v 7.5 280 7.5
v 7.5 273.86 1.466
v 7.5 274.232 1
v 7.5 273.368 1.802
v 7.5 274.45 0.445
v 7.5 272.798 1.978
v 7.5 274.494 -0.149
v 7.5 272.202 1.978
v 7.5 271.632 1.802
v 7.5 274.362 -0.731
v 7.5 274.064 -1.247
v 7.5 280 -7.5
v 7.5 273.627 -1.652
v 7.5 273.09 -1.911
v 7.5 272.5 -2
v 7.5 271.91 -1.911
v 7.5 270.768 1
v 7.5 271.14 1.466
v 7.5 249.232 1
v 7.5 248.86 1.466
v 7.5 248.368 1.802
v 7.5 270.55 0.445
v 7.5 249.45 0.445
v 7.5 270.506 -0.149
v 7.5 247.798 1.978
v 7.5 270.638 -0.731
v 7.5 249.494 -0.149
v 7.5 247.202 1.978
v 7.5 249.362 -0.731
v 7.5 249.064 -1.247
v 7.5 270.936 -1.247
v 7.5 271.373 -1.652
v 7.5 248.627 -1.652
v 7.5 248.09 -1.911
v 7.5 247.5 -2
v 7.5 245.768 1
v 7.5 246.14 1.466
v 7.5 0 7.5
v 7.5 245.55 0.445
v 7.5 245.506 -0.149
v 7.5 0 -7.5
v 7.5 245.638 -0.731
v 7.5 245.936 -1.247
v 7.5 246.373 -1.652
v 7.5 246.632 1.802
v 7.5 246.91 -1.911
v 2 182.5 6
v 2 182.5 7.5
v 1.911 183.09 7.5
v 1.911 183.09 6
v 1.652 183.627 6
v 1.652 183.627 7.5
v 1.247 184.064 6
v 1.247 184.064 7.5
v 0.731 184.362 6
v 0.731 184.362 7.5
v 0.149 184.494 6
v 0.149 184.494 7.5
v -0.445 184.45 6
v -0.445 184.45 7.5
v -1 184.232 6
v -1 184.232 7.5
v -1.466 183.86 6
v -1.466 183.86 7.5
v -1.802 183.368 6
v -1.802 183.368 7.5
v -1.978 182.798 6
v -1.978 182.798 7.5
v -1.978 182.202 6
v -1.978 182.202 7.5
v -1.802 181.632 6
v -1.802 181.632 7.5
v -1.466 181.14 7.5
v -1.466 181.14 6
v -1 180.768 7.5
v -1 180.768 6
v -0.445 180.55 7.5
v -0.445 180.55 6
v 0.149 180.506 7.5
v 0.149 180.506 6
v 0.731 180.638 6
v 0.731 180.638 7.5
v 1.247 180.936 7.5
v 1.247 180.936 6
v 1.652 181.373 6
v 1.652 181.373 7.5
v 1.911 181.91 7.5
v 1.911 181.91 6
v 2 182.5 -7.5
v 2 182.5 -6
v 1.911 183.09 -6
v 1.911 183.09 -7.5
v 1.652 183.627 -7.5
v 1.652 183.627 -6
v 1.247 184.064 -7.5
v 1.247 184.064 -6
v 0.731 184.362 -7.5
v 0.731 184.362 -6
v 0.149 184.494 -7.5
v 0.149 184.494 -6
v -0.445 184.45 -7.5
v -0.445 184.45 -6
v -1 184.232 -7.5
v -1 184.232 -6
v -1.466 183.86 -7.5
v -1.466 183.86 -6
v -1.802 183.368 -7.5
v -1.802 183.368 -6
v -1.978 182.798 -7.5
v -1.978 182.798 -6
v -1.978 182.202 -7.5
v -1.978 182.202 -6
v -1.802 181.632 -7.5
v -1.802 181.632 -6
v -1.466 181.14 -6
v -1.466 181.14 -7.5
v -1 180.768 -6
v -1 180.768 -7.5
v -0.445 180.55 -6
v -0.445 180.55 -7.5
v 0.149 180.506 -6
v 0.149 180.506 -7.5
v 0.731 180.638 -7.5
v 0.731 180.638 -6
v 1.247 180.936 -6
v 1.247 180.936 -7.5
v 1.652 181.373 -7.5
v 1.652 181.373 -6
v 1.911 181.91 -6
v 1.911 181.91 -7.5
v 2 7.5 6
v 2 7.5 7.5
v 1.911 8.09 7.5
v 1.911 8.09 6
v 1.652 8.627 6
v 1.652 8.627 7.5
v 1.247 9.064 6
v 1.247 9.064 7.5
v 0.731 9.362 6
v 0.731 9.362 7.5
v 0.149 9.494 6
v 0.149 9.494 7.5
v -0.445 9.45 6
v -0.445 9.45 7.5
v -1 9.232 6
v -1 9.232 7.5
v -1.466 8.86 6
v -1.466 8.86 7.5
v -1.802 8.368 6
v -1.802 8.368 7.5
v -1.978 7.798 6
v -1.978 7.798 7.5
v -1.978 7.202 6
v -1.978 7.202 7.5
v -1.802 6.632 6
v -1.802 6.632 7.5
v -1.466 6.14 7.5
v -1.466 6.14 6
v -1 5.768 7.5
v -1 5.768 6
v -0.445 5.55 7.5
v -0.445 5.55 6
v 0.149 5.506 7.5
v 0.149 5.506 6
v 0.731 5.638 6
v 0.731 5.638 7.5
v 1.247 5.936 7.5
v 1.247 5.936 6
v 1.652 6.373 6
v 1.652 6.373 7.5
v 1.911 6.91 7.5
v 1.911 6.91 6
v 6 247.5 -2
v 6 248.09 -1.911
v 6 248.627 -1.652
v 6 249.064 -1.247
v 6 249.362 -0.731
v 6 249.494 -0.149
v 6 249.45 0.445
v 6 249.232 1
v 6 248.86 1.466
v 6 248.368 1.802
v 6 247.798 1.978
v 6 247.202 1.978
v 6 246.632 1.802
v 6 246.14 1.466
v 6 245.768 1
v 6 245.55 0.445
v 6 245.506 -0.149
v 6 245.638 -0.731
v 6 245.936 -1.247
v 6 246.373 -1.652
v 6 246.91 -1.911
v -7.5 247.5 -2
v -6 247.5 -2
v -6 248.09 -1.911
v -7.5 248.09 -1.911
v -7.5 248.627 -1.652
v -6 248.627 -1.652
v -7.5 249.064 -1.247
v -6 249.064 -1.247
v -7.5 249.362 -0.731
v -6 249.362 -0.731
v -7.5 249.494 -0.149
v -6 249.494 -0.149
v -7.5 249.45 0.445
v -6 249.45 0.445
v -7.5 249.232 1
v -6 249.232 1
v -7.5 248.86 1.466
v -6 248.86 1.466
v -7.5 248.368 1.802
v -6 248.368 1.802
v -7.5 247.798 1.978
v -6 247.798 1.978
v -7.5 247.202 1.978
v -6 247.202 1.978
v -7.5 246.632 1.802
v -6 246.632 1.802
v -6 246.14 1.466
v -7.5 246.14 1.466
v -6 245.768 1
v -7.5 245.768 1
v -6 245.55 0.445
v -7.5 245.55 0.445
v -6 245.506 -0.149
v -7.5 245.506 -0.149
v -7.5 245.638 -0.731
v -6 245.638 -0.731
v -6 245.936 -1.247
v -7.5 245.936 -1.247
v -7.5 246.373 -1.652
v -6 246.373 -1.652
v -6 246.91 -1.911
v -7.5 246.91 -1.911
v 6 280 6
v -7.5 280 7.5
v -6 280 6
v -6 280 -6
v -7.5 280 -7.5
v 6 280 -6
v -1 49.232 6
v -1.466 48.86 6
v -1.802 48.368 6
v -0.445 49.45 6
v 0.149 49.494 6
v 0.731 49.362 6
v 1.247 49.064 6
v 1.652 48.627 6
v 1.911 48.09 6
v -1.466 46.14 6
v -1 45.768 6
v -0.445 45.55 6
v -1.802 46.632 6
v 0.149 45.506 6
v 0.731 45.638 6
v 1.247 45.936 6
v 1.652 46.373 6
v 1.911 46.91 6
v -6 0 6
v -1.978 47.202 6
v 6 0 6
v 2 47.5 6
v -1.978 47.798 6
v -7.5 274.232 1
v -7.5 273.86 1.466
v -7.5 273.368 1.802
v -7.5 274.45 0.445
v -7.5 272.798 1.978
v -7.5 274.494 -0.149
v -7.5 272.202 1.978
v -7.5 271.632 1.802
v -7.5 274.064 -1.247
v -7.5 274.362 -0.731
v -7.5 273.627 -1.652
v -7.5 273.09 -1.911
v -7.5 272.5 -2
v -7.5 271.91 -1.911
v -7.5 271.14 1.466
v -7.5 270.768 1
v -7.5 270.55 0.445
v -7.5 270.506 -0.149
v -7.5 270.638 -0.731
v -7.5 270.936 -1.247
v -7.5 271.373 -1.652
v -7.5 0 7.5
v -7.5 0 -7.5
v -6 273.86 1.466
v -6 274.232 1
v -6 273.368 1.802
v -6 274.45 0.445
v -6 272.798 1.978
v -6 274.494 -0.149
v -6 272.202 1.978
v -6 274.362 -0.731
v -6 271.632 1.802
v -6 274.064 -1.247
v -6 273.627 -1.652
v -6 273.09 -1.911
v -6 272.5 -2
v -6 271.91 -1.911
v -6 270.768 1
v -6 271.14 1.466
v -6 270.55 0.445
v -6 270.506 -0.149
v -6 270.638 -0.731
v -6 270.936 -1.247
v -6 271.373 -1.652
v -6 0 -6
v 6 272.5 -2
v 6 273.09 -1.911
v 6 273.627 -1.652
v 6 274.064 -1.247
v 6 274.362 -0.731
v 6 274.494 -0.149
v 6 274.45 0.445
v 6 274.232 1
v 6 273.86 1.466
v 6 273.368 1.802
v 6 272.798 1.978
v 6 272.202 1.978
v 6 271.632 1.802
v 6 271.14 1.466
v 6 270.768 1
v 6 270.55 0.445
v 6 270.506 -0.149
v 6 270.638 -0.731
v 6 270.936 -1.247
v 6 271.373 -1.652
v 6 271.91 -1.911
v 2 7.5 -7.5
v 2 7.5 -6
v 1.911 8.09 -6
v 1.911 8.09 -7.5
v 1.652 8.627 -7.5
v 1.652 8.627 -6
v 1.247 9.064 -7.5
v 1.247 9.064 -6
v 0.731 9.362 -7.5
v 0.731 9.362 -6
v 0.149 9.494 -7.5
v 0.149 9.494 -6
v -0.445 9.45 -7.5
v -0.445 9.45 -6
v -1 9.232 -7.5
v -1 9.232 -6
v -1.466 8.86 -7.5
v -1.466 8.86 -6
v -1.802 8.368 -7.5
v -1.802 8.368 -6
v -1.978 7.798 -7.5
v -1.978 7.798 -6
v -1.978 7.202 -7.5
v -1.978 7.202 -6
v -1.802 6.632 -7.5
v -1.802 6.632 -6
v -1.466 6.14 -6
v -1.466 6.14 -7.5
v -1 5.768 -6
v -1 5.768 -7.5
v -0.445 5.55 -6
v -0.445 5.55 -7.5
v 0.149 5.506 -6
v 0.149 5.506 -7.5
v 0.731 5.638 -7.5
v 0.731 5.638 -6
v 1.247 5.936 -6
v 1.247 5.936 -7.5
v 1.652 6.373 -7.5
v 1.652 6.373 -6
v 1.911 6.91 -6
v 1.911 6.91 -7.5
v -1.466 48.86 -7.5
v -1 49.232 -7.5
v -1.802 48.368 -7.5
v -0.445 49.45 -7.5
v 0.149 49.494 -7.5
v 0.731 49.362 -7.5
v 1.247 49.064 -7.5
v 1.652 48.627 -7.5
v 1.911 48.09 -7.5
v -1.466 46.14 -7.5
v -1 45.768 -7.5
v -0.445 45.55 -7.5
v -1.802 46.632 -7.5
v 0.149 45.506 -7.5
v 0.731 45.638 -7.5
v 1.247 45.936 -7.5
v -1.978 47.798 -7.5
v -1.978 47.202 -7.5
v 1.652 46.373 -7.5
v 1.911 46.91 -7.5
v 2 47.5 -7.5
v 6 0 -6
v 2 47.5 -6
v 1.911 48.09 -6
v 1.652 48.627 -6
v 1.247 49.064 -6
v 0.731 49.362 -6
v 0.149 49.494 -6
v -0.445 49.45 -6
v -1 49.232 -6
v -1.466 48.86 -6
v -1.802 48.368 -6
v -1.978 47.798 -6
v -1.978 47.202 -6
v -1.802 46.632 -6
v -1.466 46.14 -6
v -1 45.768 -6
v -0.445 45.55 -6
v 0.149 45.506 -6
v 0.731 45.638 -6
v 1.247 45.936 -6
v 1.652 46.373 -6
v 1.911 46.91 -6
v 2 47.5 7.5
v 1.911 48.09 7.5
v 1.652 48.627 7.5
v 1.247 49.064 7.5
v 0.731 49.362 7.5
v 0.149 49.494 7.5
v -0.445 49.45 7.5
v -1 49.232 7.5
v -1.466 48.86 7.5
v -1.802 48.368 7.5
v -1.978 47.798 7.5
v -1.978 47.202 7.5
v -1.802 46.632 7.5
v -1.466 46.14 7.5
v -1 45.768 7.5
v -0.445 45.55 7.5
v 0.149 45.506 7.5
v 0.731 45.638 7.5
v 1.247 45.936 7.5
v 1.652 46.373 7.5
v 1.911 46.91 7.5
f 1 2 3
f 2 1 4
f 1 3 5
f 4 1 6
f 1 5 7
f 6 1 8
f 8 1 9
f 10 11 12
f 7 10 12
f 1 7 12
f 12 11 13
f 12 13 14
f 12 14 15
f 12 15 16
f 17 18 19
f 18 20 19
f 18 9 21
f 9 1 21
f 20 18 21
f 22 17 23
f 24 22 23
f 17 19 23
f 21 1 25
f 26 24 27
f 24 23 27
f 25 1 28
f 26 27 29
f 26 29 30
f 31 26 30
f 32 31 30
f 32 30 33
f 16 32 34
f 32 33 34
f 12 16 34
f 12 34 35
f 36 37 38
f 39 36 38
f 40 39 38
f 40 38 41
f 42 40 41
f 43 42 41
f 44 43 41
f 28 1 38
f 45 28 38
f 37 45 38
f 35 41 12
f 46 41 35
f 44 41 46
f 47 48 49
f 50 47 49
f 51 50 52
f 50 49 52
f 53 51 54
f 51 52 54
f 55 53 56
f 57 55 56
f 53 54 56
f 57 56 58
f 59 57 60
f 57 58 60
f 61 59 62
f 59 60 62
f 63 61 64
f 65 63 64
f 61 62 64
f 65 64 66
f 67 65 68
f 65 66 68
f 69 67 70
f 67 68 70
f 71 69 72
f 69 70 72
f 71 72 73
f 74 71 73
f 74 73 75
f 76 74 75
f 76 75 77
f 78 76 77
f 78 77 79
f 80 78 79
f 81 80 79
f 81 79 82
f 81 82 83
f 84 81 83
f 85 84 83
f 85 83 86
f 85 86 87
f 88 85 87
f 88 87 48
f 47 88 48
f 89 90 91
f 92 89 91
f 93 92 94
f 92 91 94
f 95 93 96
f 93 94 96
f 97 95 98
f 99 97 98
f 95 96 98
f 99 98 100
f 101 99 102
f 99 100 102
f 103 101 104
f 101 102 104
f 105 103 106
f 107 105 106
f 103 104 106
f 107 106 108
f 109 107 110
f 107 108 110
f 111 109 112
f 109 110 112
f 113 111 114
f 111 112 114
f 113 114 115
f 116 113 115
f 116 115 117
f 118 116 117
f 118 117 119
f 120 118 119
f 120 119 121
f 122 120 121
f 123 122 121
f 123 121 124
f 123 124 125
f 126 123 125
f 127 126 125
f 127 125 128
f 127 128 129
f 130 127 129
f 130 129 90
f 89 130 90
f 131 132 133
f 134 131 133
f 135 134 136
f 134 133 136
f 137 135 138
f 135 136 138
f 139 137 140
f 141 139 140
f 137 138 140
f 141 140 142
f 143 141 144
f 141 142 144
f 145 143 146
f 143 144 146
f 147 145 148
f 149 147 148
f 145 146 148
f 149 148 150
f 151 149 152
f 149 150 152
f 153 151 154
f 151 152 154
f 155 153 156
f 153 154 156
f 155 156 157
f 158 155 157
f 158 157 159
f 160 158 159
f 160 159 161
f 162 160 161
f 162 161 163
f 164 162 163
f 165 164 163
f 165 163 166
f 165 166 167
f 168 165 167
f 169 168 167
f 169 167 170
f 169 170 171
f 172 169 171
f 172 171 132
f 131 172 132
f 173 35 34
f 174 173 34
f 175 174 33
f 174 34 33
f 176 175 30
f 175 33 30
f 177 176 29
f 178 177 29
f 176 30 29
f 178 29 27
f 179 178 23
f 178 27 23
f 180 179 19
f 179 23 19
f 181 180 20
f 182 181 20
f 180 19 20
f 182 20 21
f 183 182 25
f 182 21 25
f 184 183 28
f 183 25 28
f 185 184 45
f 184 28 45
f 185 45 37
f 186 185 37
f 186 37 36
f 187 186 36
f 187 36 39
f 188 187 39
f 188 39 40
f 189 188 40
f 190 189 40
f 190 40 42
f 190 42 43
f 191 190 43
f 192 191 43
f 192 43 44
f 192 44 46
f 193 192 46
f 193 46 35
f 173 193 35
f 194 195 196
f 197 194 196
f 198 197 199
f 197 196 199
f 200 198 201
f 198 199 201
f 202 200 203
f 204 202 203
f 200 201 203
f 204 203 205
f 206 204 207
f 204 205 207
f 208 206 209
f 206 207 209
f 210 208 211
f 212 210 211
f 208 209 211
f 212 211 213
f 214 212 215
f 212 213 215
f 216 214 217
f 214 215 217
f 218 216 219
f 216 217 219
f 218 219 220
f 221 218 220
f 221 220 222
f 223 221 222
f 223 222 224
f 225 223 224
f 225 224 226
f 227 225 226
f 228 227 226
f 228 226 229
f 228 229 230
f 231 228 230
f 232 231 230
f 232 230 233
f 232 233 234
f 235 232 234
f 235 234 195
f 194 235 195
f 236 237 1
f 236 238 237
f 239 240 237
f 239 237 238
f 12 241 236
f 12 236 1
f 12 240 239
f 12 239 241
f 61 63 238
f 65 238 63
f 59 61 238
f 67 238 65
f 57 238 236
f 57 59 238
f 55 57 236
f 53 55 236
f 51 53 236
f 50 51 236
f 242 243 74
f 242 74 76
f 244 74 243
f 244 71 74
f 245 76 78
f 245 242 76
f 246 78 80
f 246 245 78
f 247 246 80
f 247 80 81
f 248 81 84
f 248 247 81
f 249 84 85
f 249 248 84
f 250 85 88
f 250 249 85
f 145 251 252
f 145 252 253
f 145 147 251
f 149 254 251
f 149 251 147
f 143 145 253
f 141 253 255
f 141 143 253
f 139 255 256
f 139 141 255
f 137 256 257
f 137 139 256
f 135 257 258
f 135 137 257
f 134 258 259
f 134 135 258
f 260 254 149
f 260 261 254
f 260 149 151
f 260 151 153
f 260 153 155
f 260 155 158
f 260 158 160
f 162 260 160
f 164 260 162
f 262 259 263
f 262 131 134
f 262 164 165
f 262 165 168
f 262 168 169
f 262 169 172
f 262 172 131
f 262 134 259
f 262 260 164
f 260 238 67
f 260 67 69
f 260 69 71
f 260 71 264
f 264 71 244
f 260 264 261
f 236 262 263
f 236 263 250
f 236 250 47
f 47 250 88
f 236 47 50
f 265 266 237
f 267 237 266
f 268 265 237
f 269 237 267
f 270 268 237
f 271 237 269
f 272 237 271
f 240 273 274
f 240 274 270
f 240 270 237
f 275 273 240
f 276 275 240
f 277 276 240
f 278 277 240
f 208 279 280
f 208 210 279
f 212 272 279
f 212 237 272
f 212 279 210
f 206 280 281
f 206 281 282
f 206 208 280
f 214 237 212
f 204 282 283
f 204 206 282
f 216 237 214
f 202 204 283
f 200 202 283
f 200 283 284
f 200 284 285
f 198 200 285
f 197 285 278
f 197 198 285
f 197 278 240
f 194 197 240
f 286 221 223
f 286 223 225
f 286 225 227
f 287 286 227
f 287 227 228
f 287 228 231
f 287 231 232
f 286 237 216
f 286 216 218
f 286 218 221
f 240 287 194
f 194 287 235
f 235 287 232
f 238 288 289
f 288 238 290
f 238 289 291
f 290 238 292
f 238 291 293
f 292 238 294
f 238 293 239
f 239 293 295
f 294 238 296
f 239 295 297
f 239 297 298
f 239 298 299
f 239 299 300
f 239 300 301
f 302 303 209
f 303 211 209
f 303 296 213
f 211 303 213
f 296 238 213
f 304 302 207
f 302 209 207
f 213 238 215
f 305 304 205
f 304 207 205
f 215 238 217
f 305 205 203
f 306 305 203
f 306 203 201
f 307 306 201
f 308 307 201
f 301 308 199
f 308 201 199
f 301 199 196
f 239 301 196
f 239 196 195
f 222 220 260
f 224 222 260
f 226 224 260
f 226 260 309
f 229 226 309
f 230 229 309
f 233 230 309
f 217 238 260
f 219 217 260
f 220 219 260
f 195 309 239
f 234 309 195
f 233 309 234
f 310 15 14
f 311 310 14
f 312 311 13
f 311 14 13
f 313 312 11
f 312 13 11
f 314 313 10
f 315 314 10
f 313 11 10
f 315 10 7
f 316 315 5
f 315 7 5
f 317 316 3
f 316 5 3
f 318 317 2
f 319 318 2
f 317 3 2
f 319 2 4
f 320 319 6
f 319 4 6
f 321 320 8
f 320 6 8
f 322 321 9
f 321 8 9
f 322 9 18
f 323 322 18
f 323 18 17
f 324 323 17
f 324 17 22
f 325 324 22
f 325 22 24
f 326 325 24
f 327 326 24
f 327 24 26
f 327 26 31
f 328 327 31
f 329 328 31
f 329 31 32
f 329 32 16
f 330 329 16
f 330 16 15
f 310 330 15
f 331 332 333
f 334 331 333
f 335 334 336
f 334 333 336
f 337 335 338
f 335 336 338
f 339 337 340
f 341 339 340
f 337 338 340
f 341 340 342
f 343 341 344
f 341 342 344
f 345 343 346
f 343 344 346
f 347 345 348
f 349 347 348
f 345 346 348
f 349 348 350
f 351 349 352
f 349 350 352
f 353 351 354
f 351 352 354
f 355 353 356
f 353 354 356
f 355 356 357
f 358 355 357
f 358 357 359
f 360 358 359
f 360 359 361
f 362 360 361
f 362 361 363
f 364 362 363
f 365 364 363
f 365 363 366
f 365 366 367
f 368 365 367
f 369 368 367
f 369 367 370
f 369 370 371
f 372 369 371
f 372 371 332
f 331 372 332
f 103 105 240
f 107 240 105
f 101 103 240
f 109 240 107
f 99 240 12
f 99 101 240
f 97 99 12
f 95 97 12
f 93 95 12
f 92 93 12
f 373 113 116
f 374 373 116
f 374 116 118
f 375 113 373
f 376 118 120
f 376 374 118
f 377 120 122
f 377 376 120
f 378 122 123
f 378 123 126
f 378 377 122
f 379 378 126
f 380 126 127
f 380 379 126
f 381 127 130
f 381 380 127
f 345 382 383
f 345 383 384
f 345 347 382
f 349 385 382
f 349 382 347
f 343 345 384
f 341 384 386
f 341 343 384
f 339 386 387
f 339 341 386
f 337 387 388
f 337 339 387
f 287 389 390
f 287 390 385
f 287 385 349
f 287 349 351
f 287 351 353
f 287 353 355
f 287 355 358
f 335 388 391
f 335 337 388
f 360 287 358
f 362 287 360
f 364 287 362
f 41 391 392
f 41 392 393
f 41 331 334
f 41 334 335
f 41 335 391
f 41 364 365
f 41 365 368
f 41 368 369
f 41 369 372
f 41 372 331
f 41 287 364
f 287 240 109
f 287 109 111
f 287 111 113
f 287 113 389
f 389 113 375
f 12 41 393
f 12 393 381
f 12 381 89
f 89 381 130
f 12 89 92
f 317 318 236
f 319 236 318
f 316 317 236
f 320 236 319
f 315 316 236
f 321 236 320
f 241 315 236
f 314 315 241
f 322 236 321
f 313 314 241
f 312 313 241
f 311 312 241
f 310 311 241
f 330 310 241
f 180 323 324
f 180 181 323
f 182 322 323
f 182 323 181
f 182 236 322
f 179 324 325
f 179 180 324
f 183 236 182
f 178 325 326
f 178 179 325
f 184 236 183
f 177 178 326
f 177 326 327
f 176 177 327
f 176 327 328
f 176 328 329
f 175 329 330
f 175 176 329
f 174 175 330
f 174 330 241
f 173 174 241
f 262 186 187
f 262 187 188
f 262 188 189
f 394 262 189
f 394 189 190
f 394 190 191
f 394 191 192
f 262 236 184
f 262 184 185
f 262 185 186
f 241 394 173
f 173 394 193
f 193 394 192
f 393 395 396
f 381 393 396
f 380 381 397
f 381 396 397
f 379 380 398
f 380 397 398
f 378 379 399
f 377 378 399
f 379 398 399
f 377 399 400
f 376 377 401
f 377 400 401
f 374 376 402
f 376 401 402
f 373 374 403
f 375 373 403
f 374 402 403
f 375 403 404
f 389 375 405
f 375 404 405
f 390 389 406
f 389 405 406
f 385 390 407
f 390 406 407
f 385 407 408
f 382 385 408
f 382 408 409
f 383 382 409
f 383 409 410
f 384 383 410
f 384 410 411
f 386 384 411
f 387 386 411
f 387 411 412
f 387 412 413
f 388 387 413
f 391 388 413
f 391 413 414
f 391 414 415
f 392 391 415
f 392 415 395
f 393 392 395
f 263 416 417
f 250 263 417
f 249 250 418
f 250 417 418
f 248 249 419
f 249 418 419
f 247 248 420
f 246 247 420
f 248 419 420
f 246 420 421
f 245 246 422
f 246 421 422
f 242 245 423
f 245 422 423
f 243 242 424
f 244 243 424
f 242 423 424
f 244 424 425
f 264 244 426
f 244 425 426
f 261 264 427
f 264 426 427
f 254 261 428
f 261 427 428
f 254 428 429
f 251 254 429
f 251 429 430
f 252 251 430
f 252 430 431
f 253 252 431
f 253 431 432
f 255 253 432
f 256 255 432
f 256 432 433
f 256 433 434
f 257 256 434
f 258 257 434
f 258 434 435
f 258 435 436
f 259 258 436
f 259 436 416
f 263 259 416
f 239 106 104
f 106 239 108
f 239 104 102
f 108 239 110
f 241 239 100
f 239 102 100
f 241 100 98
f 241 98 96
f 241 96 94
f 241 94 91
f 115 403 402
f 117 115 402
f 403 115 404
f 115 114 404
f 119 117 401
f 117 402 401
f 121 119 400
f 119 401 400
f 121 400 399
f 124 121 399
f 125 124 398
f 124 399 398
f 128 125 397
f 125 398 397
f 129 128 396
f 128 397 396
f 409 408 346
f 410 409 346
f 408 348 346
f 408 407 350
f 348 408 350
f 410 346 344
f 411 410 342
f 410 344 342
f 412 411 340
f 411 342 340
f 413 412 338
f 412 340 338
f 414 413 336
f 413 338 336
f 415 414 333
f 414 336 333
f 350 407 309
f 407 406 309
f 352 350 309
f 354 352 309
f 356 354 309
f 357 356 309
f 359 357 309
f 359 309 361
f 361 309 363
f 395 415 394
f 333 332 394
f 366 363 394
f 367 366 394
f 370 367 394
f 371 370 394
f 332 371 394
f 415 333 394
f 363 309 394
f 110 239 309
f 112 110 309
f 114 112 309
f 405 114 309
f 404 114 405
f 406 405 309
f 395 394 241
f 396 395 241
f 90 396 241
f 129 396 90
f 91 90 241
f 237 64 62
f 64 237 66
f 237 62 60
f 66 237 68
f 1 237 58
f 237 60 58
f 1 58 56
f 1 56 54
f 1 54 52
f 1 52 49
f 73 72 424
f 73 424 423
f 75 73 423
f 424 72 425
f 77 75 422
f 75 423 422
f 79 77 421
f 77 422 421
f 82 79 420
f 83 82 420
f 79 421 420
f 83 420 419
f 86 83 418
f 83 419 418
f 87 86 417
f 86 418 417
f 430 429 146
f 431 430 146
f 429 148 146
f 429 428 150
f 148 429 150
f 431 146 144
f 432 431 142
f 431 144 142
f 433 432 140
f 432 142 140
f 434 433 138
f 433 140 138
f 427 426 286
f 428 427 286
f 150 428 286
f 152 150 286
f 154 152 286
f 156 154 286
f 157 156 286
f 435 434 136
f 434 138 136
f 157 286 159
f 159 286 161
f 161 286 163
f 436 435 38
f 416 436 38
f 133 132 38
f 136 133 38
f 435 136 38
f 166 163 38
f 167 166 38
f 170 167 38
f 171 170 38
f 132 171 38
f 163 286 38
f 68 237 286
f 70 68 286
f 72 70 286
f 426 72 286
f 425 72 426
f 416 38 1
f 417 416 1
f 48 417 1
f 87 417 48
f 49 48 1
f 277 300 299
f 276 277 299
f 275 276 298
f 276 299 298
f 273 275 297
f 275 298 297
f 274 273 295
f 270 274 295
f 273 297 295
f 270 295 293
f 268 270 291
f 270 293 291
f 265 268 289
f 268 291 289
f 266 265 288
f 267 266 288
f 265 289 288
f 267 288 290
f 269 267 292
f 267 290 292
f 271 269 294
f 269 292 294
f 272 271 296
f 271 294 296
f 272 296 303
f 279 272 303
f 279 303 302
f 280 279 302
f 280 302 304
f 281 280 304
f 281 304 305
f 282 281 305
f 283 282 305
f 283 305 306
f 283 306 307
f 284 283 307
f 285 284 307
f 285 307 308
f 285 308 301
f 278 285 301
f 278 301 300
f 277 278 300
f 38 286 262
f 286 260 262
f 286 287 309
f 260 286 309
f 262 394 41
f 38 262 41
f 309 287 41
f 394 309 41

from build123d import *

# Parameters (mm, degrees)
SKETCH_1_W          = 15
SKETCH_1_H          = 15
SKETCH_1_W_2        = 12
SKETCH_1_H_2        = 12
EXTRUDE_1_DEPTH     = 280
SKETCH_2_R          = 2
CUT_EXTRUDE_1_DEPTH = 281.501782526
SKETCH_3_R          = 2
CUT_EXTRUDE_2_DEPTH = 281.501782526


with BuildPart() as part:
    # ｽｹｯﾁ1 → 押し出し-薄板1 (new body)
    with BuildSketch(Plane(origin=(0, 0, 0), x_dir=(1, 0, 0), z_dir=(0, 1, 0))):
        Rectangle(SKETCH_1_W, SKETCH_1_H)
        Rectangle(SKETCH_1_W_2, SKETCH_1_H_2, mode=Mode.SUBTRACT)
    extrude(amount=EXTRUDE_1_DEPTH)

    # ｽｹｯﾁ2 → ｶｯﾄ - 押し出し1 (cut, through all)
    with BuildSketch(Plane(origin=(7.5, 0, 0), x_dir=(0, 0, -1), z_dir=(1, 0, 0))):
        with Locations((0, 272.5)):
            Circle(SKETCH_2_R)
        with Locations((0, 247.5)):
            Circle(SKETCH_2_R)
    extrude(amount=-CUT_EXTRUDE_1_DEPTH, mode=Mode.SUBTRACT)

    # ｽｹｯﾁ3 → ｶｯﾄ - 押し出し2 (cut, through all)
    with BuildSketch(Plane.XY.offset(7.5)):
        with Locations((0, 7.5)):
            Circle(SKETCH_3_R)
        with Locations((0, 47.5)):
            Circle(SKETCH_3_R)
        with Locations((0, 182.5)):
            Circle(SKETCH_3_R)
    extrude(amount=-CUT_EXTRUDE_2_DEPTH, mode=Mode.SUBTRACT)


solid = part.part
